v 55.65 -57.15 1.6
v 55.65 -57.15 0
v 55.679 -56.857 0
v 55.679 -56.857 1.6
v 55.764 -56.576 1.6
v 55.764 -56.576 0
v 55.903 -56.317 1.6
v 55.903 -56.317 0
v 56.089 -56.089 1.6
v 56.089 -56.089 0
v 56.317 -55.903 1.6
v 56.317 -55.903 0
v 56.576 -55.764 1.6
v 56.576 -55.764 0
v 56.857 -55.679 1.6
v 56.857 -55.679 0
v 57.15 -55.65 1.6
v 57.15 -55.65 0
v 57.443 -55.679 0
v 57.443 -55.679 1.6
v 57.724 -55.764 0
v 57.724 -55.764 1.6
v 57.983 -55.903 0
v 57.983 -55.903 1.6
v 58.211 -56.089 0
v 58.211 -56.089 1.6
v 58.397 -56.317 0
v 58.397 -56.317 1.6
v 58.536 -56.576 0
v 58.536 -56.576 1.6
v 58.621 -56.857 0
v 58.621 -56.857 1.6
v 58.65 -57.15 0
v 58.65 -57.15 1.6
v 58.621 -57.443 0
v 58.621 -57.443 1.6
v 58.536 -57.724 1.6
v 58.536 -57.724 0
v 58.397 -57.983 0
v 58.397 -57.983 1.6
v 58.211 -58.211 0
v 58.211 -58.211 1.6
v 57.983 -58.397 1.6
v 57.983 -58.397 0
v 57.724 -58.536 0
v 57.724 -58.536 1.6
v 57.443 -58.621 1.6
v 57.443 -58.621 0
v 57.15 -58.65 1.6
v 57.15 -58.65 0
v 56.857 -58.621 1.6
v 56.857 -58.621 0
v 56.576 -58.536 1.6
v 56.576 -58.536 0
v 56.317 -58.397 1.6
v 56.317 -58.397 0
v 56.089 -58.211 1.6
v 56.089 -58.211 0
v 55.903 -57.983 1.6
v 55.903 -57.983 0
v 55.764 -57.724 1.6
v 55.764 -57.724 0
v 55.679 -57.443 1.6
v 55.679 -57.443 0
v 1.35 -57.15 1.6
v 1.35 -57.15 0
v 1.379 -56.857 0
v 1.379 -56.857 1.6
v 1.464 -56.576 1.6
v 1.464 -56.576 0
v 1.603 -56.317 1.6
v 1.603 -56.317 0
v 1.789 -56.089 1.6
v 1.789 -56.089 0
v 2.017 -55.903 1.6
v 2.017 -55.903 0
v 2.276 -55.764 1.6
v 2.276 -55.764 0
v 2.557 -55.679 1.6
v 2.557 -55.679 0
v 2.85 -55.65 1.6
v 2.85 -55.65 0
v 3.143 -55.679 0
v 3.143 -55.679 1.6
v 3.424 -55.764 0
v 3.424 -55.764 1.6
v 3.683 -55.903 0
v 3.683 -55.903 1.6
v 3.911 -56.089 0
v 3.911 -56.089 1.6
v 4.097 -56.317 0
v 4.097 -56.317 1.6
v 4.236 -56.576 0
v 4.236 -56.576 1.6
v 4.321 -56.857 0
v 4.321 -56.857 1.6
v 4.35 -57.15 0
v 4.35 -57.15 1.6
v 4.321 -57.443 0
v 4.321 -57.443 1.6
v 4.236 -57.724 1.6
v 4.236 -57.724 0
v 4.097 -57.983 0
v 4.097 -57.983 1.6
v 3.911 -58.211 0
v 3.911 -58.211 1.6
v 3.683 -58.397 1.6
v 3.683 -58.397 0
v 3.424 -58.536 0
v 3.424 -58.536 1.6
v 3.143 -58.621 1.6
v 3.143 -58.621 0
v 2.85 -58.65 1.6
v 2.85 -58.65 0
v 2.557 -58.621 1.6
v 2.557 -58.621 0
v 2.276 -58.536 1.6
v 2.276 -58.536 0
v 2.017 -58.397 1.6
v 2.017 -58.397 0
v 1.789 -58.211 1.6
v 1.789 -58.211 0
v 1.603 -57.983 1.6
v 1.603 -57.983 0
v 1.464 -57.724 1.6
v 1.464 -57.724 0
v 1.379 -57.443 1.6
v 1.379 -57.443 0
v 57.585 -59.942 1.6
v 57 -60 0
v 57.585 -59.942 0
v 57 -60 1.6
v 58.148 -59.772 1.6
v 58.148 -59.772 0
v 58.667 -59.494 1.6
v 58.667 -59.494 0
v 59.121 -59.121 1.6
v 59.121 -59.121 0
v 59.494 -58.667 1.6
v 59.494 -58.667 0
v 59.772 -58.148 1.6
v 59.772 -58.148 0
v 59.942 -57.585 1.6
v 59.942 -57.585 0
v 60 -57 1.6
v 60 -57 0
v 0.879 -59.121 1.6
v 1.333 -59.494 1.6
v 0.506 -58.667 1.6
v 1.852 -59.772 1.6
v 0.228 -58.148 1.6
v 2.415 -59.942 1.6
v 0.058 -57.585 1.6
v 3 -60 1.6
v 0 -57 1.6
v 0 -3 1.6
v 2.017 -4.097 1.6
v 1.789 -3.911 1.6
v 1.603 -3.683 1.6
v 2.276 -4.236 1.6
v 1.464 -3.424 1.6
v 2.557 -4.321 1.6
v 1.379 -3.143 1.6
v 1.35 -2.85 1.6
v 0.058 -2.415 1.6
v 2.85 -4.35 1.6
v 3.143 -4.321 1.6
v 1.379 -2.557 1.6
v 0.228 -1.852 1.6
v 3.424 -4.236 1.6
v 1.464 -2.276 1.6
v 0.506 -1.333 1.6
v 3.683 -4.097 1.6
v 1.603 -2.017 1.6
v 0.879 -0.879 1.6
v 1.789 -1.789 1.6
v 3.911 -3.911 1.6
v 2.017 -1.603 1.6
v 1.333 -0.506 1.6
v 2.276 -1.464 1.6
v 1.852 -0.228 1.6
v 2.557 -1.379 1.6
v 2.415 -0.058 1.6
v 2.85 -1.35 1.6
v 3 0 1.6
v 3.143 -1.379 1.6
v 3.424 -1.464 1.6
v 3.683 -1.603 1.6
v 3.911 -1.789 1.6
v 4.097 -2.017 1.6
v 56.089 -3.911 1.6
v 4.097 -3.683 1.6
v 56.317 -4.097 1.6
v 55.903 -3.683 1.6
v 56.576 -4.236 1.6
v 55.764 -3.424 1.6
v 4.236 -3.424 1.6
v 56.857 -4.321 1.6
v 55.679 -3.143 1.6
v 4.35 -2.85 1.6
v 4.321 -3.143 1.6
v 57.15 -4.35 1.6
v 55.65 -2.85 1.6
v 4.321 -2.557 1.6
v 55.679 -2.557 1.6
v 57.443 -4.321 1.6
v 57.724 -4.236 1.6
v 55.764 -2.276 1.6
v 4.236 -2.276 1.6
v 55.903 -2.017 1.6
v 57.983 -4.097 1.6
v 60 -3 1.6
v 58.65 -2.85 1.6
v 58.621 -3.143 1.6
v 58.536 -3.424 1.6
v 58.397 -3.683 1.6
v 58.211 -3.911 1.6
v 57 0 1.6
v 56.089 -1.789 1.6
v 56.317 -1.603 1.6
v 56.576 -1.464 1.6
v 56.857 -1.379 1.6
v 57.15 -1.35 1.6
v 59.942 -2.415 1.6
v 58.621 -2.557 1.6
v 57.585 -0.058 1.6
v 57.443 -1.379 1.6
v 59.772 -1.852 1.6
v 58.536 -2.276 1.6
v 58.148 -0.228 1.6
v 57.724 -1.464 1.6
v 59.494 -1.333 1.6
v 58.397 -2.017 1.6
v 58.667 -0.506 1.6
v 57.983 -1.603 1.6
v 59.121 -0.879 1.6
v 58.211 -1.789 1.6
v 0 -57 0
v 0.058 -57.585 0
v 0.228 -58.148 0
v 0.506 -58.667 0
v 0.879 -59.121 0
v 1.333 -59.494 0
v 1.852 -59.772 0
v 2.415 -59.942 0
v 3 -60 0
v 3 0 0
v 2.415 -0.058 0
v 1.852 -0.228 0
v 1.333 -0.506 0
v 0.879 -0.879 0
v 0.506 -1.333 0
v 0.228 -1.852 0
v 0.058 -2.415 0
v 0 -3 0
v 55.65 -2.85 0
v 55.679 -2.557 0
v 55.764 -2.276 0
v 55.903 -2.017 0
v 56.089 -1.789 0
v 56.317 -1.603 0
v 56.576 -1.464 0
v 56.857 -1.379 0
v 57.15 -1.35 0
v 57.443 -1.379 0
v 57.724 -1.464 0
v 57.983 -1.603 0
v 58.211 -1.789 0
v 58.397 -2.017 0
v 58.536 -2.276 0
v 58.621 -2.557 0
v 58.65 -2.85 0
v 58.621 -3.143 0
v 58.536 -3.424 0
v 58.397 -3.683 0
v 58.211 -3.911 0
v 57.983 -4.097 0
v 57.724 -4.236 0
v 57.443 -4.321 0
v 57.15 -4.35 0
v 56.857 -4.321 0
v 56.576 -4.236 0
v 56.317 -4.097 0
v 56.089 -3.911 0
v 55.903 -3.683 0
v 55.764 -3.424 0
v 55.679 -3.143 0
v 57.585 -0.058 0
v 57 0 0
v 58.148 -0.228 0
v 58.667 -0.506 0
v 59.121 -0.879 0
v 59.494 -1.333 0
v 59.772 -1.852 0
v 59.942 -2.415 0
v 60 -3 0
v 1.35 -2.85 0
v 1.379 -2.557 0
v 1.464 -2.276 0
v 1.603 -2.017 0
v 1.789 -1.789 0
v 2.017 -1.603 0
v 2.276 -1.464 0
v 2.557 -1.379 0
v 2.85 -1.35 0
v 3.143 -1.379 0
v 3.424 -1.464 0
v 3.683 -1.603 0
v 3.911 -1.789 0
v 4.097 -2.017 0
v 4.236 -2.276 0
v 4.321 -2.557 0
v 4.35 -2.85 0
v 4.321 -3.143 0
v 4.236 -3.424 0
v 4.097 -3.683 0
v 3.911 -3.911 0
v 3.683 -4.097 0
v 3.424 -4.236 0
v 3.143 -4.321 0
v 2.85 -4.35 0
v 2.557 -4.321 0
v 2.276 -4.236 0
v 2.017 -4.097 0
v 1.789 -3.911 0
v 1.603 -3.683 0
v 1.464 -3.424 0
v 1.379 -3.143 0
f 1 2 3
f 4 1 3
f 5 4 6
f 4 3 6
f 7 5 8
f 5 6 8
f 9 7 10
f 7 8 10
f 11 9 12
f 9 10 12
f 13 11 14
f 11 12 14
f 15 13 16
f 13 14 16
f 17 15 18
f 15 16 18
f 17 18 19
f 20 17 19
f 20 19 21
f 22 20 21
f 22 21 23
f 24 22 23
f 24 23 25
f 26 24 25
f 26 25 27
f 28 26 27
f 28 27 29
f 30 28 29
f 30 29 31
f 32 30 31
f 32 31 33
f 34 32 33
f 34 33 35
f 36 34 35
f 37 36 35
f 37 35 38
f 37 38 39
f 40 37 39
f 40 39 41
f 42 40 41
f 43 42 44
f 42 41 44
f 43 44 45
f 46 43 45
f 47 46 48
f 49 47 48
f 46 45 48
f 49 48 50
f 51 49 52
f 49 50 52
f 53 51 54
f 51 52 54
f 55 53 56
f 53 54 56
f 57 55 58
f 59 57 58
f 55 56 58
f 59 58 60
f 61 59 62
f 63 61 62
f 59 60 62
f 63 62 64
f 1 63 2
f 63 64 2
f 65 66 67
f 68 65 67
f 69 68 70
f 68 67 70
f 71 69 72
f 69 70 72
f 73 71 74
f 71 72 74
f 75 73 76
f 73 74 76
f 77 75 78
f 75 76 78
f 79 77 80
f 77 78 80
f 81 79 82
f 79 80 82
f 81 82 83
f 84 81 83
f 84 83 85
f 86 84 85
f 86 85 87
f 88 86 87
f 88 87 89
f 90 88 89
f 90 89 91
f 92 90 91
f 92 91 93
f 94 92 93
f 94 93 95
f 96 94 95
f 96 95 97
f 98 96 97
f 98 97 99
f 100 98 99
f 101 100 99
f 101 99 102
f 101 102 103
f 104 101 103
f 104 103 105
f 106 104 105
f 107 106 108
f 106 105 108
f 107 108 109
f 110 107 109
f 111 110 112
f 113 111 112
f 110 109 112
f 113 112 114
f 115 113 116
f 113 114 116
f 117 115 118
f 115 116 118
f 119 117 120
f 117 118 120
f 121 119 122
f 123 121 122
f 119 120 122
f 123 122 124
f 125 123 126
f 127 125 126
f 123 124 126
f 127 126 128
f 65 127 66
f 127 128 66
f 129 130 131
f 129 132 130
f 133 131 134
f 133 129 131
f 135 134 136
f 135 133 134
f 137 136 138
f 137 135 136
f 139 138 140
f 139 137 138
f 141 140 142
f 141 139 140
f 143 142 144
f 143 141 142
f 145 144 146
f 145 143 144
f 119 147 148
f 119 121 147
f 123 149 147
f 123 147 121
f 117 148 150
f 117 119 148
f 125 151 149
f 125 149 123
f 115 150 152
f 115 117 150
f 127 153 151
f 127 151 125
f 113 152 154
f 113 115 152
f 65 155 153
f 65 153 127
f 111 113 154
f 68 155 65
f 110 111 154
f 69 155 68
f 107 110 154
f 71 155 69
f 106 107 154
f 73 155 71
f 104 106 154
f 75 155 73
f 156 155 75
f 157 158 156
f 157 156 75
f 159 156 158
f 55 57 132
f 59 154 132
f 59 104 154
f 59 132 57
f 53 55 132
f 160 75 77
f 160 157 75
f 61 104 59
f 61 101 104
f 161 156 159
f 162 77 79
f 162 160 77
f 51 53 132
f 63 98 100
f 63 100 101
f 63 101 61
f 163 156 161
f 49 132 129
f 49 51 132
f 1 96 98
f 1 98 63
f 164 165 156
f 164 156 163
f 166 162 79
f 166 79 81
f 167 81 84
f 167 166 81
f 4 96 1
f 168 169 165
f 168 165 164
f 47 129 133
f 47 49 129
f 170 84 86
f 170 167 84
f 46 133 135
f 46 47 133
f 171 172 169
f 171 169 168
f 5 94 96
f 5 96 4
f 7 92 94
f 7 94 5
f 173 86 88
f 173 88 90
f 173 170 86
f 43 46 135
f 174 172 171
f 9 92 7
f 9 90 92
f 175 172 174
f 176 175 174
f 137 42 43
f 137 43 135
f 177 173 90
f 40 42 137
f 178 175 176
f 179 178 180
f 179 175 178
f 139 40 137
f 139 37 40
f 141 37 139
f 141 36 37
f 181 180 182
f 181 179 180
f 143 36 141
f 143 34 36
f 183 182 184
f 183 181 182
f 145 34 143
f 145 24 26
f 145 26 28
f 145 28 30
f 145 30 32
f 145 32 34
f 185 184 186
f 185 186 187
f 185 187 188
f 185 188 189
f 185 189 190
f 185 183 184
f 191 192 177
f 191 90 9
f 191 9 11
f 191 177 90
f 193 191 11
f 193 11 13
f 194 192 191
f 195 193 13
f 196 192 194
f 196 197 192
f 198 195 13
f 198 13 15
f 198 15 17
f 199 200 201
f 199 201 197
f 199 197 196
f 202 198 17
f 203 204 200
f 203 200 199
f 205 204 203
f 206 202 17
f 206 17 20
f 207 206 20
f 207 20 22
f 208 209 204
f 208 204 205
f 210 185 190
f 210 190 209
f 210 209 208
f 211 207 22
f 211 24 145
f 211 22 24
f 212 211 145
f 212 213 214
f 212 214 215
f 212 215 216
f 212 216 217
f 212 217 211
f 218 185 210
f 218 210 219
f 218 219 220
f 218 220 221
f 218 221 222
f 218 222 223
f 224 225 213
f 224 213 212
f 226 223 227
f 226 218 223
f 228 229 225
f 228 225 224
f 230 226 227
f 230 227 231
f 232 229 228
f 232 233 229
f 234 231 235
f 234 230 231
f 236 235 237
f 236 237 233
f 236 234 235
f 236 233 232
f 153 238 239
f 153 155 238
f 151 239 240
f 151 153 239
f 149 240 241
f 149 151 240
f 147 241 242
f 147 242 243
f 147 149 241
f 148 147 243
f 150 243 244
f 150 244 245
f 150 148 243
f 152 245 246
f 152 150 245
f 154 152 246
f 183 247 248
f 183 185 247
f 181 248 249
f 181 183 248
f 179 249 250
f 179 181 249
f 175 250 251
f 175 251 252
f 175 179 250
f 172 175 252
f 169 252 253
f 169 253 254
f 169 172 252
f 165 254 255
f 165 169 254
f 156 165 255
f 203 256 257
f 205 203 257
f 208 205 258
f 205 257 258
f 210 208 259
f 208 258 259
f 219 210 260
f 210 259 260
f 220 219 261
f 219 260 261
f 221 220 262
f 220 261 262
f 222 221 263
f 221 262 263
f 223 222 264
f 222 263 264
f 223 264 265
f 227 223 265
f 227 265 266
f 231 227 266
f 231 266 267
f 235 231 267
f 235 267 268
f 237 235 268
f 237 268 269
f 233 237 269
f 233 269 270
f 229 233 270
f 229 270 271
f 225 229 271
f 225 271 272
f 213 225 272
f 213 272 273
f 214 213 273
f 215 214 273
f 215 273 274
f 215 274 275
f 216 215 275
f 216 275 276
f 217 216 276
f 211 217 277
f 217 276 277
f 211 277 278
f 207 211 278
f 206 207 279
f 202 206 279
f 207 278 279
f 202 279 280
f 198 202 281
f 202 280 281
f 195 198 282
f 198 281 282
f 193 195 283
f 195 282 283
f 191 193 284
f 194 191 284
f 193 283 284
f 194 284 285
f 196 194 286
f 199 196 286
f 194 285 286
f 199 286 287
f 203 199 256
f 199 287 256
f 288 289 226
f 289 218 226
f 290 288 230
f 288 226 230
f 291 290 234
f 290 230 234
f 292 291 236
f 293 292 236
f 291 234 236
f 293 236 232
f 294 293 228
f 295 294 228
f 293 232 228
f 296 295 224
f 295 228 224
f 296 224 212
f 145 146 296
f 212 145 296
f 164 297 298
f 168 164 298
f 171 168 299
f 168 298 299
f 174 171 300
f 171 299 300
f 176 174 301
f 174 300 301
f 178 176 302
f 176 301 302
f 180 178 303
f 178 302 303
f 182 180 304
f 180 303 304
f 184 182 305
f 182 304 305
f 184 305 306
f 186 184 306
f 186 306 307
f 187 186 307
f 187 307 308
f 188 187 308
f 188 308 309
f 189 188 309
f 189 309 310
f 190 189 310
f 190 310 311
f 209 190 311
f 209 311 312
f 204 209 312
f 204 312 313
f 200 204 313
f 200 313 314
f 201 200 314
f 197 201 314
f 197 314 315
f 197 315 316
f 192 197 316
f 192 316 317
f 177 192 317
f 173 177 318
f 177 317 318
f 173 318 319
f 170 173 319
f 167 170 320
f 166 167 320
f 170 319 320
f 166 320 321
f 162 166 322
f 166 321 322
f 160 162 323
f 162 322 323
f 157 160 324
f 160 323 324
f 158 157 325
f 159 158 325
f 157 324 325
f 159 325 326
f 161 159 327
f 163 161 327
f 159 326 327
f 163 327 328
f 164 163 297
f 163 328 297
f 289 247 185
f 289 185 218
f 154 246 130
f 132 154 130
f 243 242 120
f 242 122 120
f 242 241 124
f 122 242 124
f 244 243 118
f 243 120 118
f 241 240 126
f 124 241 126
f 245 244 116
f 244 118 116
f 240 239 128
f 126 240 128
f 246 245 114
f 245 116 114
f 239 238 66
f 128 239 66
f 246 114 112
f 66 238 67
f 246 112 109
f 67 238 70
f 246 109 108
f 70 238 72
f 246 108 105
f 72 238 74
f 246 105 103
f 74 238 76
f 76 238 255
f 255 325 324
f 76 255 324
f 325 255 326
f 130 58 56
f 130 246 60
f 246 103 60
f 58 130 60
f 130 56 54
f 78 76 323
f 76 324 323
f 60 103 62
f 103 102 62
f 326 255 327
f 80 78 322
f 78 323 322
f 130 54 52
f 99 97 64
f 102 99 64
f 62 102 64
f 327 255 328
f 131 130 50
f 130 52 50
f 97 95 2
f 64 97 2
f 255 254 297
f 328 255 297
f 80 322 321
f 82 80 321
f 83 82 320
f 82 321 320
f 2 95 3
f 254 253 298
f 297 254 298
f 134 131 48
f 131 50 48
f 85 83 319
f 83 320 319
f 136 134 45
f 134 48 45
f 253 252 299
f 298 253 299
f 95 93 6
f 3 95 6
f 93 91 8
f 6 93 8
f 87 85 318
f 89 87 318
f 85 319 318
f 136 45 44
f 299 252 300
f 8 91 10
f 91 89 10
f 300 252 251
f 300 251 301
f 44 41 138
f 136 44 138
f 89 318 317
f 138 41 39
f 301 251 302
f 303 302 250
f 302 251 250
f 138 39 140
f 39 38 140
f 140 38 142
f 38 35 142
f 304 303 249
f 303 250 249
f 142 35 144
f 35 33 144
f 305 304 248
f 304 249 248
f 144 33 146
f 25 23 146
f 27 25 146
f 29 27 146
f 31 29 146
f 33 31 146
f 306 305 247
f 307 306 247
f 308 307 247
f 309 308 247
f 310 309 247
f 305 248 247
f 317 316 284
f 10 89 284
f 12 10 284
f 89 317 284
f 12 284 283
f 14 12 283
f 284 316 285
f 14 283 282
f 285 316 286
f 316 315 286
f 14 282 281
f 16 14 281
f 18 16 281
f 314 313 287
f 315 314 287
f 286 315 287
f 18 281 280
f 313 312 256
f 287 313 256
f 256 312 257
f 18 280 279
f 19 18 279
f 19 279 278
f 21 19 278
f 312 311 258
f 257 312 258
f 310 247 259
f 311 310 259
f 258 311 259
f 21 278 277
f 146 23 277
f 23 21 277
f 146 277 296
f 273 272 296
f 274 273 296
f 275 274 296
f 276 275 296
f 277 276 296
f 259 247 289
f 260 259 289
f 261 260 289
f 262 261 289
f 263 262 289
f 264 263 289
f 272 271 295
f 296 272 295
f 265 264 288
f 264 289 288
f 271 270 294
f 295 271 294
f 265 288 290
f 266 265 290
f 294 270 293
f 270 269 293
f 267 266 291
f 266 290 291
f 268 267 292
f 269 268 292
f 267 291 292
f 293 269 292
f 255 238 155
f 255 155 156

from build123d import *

# Parameters (mm, degrees)
SKETCH_1_W          = 60
SKETCH_1_H          = 60
EXTRUDE_2_DEPTH     = 1.6
SKETCH_3_R          = 1.5
CUT_EXTRUDE_1_DEPTH = 19.6
FILLET_1_R          = 3
FILLET_2_R          = 3
FILLET_3_R          = 3
FILLET_4_R          = 3


with BuildPart() as part:
    # 草图1 → 凸台-拉伸2 (new body)
    with BuildSketch(Plane.XY):
        with Locations((30, -30)):
            Rectangle(SKETCH_1_W, SKETCH_1_H)
    extrude(amount=EXTRUDE_2_DEPTH)

    # 草图3 → 切除-拉伸1 (cut)
    with BuildSketch(Plane(origin=(0, 0, 0), x_dir=(-1, 0, 0), z_dir=(0, 0, -1))):
        with Locations((-57.15, -2.85)):
            Circle(SKETCH_3_R)
        with Locations((-2.85, -2.85)):
            Circle(SKETCH_3_R)
        with Locations((-2.85, -57.15)):
            Circle(SKETCH_3_R)
        with Locations((-57.15, -57.15)):
            Circle(SKETCH_3_R)
    extrude(amount=-CUT_EXTRUDE_1_DEPTH, mode=Mode.SUBTRACT)

    # 圆角1
    fillet_1_edges = [part.edges().sort_by_distance(p)[0] for p in [
        (60, 0, 0.8),
    ]]
    fillet(fillet_1_edges, radius=FILLET_1_R)

    # 圆角2
    fillet_2_edges = [part.edges().sort_by_distance(p)[0] for p in [
        (0, 0, 0.8),
    ]]
    fillet(fillet_2_edges, radius=FILLET_2_R)

    # 圆角3
    fillet_3_edges = [part.edges().sort_by_distance(p)[0] for p in [
        (0, -60, 0.8),
    ]]
    fillet(fillet_3_edges, radius=FILLET_3_R)

    # 圆角4
    fillet_4_edges = [part.edges().sort_by_distance(p)[0] for p in [
        (60, -60, 0.8),
    ]]
    fillet(fillet_4_edges, radius=FILLET_4_R)


solid = part.part
